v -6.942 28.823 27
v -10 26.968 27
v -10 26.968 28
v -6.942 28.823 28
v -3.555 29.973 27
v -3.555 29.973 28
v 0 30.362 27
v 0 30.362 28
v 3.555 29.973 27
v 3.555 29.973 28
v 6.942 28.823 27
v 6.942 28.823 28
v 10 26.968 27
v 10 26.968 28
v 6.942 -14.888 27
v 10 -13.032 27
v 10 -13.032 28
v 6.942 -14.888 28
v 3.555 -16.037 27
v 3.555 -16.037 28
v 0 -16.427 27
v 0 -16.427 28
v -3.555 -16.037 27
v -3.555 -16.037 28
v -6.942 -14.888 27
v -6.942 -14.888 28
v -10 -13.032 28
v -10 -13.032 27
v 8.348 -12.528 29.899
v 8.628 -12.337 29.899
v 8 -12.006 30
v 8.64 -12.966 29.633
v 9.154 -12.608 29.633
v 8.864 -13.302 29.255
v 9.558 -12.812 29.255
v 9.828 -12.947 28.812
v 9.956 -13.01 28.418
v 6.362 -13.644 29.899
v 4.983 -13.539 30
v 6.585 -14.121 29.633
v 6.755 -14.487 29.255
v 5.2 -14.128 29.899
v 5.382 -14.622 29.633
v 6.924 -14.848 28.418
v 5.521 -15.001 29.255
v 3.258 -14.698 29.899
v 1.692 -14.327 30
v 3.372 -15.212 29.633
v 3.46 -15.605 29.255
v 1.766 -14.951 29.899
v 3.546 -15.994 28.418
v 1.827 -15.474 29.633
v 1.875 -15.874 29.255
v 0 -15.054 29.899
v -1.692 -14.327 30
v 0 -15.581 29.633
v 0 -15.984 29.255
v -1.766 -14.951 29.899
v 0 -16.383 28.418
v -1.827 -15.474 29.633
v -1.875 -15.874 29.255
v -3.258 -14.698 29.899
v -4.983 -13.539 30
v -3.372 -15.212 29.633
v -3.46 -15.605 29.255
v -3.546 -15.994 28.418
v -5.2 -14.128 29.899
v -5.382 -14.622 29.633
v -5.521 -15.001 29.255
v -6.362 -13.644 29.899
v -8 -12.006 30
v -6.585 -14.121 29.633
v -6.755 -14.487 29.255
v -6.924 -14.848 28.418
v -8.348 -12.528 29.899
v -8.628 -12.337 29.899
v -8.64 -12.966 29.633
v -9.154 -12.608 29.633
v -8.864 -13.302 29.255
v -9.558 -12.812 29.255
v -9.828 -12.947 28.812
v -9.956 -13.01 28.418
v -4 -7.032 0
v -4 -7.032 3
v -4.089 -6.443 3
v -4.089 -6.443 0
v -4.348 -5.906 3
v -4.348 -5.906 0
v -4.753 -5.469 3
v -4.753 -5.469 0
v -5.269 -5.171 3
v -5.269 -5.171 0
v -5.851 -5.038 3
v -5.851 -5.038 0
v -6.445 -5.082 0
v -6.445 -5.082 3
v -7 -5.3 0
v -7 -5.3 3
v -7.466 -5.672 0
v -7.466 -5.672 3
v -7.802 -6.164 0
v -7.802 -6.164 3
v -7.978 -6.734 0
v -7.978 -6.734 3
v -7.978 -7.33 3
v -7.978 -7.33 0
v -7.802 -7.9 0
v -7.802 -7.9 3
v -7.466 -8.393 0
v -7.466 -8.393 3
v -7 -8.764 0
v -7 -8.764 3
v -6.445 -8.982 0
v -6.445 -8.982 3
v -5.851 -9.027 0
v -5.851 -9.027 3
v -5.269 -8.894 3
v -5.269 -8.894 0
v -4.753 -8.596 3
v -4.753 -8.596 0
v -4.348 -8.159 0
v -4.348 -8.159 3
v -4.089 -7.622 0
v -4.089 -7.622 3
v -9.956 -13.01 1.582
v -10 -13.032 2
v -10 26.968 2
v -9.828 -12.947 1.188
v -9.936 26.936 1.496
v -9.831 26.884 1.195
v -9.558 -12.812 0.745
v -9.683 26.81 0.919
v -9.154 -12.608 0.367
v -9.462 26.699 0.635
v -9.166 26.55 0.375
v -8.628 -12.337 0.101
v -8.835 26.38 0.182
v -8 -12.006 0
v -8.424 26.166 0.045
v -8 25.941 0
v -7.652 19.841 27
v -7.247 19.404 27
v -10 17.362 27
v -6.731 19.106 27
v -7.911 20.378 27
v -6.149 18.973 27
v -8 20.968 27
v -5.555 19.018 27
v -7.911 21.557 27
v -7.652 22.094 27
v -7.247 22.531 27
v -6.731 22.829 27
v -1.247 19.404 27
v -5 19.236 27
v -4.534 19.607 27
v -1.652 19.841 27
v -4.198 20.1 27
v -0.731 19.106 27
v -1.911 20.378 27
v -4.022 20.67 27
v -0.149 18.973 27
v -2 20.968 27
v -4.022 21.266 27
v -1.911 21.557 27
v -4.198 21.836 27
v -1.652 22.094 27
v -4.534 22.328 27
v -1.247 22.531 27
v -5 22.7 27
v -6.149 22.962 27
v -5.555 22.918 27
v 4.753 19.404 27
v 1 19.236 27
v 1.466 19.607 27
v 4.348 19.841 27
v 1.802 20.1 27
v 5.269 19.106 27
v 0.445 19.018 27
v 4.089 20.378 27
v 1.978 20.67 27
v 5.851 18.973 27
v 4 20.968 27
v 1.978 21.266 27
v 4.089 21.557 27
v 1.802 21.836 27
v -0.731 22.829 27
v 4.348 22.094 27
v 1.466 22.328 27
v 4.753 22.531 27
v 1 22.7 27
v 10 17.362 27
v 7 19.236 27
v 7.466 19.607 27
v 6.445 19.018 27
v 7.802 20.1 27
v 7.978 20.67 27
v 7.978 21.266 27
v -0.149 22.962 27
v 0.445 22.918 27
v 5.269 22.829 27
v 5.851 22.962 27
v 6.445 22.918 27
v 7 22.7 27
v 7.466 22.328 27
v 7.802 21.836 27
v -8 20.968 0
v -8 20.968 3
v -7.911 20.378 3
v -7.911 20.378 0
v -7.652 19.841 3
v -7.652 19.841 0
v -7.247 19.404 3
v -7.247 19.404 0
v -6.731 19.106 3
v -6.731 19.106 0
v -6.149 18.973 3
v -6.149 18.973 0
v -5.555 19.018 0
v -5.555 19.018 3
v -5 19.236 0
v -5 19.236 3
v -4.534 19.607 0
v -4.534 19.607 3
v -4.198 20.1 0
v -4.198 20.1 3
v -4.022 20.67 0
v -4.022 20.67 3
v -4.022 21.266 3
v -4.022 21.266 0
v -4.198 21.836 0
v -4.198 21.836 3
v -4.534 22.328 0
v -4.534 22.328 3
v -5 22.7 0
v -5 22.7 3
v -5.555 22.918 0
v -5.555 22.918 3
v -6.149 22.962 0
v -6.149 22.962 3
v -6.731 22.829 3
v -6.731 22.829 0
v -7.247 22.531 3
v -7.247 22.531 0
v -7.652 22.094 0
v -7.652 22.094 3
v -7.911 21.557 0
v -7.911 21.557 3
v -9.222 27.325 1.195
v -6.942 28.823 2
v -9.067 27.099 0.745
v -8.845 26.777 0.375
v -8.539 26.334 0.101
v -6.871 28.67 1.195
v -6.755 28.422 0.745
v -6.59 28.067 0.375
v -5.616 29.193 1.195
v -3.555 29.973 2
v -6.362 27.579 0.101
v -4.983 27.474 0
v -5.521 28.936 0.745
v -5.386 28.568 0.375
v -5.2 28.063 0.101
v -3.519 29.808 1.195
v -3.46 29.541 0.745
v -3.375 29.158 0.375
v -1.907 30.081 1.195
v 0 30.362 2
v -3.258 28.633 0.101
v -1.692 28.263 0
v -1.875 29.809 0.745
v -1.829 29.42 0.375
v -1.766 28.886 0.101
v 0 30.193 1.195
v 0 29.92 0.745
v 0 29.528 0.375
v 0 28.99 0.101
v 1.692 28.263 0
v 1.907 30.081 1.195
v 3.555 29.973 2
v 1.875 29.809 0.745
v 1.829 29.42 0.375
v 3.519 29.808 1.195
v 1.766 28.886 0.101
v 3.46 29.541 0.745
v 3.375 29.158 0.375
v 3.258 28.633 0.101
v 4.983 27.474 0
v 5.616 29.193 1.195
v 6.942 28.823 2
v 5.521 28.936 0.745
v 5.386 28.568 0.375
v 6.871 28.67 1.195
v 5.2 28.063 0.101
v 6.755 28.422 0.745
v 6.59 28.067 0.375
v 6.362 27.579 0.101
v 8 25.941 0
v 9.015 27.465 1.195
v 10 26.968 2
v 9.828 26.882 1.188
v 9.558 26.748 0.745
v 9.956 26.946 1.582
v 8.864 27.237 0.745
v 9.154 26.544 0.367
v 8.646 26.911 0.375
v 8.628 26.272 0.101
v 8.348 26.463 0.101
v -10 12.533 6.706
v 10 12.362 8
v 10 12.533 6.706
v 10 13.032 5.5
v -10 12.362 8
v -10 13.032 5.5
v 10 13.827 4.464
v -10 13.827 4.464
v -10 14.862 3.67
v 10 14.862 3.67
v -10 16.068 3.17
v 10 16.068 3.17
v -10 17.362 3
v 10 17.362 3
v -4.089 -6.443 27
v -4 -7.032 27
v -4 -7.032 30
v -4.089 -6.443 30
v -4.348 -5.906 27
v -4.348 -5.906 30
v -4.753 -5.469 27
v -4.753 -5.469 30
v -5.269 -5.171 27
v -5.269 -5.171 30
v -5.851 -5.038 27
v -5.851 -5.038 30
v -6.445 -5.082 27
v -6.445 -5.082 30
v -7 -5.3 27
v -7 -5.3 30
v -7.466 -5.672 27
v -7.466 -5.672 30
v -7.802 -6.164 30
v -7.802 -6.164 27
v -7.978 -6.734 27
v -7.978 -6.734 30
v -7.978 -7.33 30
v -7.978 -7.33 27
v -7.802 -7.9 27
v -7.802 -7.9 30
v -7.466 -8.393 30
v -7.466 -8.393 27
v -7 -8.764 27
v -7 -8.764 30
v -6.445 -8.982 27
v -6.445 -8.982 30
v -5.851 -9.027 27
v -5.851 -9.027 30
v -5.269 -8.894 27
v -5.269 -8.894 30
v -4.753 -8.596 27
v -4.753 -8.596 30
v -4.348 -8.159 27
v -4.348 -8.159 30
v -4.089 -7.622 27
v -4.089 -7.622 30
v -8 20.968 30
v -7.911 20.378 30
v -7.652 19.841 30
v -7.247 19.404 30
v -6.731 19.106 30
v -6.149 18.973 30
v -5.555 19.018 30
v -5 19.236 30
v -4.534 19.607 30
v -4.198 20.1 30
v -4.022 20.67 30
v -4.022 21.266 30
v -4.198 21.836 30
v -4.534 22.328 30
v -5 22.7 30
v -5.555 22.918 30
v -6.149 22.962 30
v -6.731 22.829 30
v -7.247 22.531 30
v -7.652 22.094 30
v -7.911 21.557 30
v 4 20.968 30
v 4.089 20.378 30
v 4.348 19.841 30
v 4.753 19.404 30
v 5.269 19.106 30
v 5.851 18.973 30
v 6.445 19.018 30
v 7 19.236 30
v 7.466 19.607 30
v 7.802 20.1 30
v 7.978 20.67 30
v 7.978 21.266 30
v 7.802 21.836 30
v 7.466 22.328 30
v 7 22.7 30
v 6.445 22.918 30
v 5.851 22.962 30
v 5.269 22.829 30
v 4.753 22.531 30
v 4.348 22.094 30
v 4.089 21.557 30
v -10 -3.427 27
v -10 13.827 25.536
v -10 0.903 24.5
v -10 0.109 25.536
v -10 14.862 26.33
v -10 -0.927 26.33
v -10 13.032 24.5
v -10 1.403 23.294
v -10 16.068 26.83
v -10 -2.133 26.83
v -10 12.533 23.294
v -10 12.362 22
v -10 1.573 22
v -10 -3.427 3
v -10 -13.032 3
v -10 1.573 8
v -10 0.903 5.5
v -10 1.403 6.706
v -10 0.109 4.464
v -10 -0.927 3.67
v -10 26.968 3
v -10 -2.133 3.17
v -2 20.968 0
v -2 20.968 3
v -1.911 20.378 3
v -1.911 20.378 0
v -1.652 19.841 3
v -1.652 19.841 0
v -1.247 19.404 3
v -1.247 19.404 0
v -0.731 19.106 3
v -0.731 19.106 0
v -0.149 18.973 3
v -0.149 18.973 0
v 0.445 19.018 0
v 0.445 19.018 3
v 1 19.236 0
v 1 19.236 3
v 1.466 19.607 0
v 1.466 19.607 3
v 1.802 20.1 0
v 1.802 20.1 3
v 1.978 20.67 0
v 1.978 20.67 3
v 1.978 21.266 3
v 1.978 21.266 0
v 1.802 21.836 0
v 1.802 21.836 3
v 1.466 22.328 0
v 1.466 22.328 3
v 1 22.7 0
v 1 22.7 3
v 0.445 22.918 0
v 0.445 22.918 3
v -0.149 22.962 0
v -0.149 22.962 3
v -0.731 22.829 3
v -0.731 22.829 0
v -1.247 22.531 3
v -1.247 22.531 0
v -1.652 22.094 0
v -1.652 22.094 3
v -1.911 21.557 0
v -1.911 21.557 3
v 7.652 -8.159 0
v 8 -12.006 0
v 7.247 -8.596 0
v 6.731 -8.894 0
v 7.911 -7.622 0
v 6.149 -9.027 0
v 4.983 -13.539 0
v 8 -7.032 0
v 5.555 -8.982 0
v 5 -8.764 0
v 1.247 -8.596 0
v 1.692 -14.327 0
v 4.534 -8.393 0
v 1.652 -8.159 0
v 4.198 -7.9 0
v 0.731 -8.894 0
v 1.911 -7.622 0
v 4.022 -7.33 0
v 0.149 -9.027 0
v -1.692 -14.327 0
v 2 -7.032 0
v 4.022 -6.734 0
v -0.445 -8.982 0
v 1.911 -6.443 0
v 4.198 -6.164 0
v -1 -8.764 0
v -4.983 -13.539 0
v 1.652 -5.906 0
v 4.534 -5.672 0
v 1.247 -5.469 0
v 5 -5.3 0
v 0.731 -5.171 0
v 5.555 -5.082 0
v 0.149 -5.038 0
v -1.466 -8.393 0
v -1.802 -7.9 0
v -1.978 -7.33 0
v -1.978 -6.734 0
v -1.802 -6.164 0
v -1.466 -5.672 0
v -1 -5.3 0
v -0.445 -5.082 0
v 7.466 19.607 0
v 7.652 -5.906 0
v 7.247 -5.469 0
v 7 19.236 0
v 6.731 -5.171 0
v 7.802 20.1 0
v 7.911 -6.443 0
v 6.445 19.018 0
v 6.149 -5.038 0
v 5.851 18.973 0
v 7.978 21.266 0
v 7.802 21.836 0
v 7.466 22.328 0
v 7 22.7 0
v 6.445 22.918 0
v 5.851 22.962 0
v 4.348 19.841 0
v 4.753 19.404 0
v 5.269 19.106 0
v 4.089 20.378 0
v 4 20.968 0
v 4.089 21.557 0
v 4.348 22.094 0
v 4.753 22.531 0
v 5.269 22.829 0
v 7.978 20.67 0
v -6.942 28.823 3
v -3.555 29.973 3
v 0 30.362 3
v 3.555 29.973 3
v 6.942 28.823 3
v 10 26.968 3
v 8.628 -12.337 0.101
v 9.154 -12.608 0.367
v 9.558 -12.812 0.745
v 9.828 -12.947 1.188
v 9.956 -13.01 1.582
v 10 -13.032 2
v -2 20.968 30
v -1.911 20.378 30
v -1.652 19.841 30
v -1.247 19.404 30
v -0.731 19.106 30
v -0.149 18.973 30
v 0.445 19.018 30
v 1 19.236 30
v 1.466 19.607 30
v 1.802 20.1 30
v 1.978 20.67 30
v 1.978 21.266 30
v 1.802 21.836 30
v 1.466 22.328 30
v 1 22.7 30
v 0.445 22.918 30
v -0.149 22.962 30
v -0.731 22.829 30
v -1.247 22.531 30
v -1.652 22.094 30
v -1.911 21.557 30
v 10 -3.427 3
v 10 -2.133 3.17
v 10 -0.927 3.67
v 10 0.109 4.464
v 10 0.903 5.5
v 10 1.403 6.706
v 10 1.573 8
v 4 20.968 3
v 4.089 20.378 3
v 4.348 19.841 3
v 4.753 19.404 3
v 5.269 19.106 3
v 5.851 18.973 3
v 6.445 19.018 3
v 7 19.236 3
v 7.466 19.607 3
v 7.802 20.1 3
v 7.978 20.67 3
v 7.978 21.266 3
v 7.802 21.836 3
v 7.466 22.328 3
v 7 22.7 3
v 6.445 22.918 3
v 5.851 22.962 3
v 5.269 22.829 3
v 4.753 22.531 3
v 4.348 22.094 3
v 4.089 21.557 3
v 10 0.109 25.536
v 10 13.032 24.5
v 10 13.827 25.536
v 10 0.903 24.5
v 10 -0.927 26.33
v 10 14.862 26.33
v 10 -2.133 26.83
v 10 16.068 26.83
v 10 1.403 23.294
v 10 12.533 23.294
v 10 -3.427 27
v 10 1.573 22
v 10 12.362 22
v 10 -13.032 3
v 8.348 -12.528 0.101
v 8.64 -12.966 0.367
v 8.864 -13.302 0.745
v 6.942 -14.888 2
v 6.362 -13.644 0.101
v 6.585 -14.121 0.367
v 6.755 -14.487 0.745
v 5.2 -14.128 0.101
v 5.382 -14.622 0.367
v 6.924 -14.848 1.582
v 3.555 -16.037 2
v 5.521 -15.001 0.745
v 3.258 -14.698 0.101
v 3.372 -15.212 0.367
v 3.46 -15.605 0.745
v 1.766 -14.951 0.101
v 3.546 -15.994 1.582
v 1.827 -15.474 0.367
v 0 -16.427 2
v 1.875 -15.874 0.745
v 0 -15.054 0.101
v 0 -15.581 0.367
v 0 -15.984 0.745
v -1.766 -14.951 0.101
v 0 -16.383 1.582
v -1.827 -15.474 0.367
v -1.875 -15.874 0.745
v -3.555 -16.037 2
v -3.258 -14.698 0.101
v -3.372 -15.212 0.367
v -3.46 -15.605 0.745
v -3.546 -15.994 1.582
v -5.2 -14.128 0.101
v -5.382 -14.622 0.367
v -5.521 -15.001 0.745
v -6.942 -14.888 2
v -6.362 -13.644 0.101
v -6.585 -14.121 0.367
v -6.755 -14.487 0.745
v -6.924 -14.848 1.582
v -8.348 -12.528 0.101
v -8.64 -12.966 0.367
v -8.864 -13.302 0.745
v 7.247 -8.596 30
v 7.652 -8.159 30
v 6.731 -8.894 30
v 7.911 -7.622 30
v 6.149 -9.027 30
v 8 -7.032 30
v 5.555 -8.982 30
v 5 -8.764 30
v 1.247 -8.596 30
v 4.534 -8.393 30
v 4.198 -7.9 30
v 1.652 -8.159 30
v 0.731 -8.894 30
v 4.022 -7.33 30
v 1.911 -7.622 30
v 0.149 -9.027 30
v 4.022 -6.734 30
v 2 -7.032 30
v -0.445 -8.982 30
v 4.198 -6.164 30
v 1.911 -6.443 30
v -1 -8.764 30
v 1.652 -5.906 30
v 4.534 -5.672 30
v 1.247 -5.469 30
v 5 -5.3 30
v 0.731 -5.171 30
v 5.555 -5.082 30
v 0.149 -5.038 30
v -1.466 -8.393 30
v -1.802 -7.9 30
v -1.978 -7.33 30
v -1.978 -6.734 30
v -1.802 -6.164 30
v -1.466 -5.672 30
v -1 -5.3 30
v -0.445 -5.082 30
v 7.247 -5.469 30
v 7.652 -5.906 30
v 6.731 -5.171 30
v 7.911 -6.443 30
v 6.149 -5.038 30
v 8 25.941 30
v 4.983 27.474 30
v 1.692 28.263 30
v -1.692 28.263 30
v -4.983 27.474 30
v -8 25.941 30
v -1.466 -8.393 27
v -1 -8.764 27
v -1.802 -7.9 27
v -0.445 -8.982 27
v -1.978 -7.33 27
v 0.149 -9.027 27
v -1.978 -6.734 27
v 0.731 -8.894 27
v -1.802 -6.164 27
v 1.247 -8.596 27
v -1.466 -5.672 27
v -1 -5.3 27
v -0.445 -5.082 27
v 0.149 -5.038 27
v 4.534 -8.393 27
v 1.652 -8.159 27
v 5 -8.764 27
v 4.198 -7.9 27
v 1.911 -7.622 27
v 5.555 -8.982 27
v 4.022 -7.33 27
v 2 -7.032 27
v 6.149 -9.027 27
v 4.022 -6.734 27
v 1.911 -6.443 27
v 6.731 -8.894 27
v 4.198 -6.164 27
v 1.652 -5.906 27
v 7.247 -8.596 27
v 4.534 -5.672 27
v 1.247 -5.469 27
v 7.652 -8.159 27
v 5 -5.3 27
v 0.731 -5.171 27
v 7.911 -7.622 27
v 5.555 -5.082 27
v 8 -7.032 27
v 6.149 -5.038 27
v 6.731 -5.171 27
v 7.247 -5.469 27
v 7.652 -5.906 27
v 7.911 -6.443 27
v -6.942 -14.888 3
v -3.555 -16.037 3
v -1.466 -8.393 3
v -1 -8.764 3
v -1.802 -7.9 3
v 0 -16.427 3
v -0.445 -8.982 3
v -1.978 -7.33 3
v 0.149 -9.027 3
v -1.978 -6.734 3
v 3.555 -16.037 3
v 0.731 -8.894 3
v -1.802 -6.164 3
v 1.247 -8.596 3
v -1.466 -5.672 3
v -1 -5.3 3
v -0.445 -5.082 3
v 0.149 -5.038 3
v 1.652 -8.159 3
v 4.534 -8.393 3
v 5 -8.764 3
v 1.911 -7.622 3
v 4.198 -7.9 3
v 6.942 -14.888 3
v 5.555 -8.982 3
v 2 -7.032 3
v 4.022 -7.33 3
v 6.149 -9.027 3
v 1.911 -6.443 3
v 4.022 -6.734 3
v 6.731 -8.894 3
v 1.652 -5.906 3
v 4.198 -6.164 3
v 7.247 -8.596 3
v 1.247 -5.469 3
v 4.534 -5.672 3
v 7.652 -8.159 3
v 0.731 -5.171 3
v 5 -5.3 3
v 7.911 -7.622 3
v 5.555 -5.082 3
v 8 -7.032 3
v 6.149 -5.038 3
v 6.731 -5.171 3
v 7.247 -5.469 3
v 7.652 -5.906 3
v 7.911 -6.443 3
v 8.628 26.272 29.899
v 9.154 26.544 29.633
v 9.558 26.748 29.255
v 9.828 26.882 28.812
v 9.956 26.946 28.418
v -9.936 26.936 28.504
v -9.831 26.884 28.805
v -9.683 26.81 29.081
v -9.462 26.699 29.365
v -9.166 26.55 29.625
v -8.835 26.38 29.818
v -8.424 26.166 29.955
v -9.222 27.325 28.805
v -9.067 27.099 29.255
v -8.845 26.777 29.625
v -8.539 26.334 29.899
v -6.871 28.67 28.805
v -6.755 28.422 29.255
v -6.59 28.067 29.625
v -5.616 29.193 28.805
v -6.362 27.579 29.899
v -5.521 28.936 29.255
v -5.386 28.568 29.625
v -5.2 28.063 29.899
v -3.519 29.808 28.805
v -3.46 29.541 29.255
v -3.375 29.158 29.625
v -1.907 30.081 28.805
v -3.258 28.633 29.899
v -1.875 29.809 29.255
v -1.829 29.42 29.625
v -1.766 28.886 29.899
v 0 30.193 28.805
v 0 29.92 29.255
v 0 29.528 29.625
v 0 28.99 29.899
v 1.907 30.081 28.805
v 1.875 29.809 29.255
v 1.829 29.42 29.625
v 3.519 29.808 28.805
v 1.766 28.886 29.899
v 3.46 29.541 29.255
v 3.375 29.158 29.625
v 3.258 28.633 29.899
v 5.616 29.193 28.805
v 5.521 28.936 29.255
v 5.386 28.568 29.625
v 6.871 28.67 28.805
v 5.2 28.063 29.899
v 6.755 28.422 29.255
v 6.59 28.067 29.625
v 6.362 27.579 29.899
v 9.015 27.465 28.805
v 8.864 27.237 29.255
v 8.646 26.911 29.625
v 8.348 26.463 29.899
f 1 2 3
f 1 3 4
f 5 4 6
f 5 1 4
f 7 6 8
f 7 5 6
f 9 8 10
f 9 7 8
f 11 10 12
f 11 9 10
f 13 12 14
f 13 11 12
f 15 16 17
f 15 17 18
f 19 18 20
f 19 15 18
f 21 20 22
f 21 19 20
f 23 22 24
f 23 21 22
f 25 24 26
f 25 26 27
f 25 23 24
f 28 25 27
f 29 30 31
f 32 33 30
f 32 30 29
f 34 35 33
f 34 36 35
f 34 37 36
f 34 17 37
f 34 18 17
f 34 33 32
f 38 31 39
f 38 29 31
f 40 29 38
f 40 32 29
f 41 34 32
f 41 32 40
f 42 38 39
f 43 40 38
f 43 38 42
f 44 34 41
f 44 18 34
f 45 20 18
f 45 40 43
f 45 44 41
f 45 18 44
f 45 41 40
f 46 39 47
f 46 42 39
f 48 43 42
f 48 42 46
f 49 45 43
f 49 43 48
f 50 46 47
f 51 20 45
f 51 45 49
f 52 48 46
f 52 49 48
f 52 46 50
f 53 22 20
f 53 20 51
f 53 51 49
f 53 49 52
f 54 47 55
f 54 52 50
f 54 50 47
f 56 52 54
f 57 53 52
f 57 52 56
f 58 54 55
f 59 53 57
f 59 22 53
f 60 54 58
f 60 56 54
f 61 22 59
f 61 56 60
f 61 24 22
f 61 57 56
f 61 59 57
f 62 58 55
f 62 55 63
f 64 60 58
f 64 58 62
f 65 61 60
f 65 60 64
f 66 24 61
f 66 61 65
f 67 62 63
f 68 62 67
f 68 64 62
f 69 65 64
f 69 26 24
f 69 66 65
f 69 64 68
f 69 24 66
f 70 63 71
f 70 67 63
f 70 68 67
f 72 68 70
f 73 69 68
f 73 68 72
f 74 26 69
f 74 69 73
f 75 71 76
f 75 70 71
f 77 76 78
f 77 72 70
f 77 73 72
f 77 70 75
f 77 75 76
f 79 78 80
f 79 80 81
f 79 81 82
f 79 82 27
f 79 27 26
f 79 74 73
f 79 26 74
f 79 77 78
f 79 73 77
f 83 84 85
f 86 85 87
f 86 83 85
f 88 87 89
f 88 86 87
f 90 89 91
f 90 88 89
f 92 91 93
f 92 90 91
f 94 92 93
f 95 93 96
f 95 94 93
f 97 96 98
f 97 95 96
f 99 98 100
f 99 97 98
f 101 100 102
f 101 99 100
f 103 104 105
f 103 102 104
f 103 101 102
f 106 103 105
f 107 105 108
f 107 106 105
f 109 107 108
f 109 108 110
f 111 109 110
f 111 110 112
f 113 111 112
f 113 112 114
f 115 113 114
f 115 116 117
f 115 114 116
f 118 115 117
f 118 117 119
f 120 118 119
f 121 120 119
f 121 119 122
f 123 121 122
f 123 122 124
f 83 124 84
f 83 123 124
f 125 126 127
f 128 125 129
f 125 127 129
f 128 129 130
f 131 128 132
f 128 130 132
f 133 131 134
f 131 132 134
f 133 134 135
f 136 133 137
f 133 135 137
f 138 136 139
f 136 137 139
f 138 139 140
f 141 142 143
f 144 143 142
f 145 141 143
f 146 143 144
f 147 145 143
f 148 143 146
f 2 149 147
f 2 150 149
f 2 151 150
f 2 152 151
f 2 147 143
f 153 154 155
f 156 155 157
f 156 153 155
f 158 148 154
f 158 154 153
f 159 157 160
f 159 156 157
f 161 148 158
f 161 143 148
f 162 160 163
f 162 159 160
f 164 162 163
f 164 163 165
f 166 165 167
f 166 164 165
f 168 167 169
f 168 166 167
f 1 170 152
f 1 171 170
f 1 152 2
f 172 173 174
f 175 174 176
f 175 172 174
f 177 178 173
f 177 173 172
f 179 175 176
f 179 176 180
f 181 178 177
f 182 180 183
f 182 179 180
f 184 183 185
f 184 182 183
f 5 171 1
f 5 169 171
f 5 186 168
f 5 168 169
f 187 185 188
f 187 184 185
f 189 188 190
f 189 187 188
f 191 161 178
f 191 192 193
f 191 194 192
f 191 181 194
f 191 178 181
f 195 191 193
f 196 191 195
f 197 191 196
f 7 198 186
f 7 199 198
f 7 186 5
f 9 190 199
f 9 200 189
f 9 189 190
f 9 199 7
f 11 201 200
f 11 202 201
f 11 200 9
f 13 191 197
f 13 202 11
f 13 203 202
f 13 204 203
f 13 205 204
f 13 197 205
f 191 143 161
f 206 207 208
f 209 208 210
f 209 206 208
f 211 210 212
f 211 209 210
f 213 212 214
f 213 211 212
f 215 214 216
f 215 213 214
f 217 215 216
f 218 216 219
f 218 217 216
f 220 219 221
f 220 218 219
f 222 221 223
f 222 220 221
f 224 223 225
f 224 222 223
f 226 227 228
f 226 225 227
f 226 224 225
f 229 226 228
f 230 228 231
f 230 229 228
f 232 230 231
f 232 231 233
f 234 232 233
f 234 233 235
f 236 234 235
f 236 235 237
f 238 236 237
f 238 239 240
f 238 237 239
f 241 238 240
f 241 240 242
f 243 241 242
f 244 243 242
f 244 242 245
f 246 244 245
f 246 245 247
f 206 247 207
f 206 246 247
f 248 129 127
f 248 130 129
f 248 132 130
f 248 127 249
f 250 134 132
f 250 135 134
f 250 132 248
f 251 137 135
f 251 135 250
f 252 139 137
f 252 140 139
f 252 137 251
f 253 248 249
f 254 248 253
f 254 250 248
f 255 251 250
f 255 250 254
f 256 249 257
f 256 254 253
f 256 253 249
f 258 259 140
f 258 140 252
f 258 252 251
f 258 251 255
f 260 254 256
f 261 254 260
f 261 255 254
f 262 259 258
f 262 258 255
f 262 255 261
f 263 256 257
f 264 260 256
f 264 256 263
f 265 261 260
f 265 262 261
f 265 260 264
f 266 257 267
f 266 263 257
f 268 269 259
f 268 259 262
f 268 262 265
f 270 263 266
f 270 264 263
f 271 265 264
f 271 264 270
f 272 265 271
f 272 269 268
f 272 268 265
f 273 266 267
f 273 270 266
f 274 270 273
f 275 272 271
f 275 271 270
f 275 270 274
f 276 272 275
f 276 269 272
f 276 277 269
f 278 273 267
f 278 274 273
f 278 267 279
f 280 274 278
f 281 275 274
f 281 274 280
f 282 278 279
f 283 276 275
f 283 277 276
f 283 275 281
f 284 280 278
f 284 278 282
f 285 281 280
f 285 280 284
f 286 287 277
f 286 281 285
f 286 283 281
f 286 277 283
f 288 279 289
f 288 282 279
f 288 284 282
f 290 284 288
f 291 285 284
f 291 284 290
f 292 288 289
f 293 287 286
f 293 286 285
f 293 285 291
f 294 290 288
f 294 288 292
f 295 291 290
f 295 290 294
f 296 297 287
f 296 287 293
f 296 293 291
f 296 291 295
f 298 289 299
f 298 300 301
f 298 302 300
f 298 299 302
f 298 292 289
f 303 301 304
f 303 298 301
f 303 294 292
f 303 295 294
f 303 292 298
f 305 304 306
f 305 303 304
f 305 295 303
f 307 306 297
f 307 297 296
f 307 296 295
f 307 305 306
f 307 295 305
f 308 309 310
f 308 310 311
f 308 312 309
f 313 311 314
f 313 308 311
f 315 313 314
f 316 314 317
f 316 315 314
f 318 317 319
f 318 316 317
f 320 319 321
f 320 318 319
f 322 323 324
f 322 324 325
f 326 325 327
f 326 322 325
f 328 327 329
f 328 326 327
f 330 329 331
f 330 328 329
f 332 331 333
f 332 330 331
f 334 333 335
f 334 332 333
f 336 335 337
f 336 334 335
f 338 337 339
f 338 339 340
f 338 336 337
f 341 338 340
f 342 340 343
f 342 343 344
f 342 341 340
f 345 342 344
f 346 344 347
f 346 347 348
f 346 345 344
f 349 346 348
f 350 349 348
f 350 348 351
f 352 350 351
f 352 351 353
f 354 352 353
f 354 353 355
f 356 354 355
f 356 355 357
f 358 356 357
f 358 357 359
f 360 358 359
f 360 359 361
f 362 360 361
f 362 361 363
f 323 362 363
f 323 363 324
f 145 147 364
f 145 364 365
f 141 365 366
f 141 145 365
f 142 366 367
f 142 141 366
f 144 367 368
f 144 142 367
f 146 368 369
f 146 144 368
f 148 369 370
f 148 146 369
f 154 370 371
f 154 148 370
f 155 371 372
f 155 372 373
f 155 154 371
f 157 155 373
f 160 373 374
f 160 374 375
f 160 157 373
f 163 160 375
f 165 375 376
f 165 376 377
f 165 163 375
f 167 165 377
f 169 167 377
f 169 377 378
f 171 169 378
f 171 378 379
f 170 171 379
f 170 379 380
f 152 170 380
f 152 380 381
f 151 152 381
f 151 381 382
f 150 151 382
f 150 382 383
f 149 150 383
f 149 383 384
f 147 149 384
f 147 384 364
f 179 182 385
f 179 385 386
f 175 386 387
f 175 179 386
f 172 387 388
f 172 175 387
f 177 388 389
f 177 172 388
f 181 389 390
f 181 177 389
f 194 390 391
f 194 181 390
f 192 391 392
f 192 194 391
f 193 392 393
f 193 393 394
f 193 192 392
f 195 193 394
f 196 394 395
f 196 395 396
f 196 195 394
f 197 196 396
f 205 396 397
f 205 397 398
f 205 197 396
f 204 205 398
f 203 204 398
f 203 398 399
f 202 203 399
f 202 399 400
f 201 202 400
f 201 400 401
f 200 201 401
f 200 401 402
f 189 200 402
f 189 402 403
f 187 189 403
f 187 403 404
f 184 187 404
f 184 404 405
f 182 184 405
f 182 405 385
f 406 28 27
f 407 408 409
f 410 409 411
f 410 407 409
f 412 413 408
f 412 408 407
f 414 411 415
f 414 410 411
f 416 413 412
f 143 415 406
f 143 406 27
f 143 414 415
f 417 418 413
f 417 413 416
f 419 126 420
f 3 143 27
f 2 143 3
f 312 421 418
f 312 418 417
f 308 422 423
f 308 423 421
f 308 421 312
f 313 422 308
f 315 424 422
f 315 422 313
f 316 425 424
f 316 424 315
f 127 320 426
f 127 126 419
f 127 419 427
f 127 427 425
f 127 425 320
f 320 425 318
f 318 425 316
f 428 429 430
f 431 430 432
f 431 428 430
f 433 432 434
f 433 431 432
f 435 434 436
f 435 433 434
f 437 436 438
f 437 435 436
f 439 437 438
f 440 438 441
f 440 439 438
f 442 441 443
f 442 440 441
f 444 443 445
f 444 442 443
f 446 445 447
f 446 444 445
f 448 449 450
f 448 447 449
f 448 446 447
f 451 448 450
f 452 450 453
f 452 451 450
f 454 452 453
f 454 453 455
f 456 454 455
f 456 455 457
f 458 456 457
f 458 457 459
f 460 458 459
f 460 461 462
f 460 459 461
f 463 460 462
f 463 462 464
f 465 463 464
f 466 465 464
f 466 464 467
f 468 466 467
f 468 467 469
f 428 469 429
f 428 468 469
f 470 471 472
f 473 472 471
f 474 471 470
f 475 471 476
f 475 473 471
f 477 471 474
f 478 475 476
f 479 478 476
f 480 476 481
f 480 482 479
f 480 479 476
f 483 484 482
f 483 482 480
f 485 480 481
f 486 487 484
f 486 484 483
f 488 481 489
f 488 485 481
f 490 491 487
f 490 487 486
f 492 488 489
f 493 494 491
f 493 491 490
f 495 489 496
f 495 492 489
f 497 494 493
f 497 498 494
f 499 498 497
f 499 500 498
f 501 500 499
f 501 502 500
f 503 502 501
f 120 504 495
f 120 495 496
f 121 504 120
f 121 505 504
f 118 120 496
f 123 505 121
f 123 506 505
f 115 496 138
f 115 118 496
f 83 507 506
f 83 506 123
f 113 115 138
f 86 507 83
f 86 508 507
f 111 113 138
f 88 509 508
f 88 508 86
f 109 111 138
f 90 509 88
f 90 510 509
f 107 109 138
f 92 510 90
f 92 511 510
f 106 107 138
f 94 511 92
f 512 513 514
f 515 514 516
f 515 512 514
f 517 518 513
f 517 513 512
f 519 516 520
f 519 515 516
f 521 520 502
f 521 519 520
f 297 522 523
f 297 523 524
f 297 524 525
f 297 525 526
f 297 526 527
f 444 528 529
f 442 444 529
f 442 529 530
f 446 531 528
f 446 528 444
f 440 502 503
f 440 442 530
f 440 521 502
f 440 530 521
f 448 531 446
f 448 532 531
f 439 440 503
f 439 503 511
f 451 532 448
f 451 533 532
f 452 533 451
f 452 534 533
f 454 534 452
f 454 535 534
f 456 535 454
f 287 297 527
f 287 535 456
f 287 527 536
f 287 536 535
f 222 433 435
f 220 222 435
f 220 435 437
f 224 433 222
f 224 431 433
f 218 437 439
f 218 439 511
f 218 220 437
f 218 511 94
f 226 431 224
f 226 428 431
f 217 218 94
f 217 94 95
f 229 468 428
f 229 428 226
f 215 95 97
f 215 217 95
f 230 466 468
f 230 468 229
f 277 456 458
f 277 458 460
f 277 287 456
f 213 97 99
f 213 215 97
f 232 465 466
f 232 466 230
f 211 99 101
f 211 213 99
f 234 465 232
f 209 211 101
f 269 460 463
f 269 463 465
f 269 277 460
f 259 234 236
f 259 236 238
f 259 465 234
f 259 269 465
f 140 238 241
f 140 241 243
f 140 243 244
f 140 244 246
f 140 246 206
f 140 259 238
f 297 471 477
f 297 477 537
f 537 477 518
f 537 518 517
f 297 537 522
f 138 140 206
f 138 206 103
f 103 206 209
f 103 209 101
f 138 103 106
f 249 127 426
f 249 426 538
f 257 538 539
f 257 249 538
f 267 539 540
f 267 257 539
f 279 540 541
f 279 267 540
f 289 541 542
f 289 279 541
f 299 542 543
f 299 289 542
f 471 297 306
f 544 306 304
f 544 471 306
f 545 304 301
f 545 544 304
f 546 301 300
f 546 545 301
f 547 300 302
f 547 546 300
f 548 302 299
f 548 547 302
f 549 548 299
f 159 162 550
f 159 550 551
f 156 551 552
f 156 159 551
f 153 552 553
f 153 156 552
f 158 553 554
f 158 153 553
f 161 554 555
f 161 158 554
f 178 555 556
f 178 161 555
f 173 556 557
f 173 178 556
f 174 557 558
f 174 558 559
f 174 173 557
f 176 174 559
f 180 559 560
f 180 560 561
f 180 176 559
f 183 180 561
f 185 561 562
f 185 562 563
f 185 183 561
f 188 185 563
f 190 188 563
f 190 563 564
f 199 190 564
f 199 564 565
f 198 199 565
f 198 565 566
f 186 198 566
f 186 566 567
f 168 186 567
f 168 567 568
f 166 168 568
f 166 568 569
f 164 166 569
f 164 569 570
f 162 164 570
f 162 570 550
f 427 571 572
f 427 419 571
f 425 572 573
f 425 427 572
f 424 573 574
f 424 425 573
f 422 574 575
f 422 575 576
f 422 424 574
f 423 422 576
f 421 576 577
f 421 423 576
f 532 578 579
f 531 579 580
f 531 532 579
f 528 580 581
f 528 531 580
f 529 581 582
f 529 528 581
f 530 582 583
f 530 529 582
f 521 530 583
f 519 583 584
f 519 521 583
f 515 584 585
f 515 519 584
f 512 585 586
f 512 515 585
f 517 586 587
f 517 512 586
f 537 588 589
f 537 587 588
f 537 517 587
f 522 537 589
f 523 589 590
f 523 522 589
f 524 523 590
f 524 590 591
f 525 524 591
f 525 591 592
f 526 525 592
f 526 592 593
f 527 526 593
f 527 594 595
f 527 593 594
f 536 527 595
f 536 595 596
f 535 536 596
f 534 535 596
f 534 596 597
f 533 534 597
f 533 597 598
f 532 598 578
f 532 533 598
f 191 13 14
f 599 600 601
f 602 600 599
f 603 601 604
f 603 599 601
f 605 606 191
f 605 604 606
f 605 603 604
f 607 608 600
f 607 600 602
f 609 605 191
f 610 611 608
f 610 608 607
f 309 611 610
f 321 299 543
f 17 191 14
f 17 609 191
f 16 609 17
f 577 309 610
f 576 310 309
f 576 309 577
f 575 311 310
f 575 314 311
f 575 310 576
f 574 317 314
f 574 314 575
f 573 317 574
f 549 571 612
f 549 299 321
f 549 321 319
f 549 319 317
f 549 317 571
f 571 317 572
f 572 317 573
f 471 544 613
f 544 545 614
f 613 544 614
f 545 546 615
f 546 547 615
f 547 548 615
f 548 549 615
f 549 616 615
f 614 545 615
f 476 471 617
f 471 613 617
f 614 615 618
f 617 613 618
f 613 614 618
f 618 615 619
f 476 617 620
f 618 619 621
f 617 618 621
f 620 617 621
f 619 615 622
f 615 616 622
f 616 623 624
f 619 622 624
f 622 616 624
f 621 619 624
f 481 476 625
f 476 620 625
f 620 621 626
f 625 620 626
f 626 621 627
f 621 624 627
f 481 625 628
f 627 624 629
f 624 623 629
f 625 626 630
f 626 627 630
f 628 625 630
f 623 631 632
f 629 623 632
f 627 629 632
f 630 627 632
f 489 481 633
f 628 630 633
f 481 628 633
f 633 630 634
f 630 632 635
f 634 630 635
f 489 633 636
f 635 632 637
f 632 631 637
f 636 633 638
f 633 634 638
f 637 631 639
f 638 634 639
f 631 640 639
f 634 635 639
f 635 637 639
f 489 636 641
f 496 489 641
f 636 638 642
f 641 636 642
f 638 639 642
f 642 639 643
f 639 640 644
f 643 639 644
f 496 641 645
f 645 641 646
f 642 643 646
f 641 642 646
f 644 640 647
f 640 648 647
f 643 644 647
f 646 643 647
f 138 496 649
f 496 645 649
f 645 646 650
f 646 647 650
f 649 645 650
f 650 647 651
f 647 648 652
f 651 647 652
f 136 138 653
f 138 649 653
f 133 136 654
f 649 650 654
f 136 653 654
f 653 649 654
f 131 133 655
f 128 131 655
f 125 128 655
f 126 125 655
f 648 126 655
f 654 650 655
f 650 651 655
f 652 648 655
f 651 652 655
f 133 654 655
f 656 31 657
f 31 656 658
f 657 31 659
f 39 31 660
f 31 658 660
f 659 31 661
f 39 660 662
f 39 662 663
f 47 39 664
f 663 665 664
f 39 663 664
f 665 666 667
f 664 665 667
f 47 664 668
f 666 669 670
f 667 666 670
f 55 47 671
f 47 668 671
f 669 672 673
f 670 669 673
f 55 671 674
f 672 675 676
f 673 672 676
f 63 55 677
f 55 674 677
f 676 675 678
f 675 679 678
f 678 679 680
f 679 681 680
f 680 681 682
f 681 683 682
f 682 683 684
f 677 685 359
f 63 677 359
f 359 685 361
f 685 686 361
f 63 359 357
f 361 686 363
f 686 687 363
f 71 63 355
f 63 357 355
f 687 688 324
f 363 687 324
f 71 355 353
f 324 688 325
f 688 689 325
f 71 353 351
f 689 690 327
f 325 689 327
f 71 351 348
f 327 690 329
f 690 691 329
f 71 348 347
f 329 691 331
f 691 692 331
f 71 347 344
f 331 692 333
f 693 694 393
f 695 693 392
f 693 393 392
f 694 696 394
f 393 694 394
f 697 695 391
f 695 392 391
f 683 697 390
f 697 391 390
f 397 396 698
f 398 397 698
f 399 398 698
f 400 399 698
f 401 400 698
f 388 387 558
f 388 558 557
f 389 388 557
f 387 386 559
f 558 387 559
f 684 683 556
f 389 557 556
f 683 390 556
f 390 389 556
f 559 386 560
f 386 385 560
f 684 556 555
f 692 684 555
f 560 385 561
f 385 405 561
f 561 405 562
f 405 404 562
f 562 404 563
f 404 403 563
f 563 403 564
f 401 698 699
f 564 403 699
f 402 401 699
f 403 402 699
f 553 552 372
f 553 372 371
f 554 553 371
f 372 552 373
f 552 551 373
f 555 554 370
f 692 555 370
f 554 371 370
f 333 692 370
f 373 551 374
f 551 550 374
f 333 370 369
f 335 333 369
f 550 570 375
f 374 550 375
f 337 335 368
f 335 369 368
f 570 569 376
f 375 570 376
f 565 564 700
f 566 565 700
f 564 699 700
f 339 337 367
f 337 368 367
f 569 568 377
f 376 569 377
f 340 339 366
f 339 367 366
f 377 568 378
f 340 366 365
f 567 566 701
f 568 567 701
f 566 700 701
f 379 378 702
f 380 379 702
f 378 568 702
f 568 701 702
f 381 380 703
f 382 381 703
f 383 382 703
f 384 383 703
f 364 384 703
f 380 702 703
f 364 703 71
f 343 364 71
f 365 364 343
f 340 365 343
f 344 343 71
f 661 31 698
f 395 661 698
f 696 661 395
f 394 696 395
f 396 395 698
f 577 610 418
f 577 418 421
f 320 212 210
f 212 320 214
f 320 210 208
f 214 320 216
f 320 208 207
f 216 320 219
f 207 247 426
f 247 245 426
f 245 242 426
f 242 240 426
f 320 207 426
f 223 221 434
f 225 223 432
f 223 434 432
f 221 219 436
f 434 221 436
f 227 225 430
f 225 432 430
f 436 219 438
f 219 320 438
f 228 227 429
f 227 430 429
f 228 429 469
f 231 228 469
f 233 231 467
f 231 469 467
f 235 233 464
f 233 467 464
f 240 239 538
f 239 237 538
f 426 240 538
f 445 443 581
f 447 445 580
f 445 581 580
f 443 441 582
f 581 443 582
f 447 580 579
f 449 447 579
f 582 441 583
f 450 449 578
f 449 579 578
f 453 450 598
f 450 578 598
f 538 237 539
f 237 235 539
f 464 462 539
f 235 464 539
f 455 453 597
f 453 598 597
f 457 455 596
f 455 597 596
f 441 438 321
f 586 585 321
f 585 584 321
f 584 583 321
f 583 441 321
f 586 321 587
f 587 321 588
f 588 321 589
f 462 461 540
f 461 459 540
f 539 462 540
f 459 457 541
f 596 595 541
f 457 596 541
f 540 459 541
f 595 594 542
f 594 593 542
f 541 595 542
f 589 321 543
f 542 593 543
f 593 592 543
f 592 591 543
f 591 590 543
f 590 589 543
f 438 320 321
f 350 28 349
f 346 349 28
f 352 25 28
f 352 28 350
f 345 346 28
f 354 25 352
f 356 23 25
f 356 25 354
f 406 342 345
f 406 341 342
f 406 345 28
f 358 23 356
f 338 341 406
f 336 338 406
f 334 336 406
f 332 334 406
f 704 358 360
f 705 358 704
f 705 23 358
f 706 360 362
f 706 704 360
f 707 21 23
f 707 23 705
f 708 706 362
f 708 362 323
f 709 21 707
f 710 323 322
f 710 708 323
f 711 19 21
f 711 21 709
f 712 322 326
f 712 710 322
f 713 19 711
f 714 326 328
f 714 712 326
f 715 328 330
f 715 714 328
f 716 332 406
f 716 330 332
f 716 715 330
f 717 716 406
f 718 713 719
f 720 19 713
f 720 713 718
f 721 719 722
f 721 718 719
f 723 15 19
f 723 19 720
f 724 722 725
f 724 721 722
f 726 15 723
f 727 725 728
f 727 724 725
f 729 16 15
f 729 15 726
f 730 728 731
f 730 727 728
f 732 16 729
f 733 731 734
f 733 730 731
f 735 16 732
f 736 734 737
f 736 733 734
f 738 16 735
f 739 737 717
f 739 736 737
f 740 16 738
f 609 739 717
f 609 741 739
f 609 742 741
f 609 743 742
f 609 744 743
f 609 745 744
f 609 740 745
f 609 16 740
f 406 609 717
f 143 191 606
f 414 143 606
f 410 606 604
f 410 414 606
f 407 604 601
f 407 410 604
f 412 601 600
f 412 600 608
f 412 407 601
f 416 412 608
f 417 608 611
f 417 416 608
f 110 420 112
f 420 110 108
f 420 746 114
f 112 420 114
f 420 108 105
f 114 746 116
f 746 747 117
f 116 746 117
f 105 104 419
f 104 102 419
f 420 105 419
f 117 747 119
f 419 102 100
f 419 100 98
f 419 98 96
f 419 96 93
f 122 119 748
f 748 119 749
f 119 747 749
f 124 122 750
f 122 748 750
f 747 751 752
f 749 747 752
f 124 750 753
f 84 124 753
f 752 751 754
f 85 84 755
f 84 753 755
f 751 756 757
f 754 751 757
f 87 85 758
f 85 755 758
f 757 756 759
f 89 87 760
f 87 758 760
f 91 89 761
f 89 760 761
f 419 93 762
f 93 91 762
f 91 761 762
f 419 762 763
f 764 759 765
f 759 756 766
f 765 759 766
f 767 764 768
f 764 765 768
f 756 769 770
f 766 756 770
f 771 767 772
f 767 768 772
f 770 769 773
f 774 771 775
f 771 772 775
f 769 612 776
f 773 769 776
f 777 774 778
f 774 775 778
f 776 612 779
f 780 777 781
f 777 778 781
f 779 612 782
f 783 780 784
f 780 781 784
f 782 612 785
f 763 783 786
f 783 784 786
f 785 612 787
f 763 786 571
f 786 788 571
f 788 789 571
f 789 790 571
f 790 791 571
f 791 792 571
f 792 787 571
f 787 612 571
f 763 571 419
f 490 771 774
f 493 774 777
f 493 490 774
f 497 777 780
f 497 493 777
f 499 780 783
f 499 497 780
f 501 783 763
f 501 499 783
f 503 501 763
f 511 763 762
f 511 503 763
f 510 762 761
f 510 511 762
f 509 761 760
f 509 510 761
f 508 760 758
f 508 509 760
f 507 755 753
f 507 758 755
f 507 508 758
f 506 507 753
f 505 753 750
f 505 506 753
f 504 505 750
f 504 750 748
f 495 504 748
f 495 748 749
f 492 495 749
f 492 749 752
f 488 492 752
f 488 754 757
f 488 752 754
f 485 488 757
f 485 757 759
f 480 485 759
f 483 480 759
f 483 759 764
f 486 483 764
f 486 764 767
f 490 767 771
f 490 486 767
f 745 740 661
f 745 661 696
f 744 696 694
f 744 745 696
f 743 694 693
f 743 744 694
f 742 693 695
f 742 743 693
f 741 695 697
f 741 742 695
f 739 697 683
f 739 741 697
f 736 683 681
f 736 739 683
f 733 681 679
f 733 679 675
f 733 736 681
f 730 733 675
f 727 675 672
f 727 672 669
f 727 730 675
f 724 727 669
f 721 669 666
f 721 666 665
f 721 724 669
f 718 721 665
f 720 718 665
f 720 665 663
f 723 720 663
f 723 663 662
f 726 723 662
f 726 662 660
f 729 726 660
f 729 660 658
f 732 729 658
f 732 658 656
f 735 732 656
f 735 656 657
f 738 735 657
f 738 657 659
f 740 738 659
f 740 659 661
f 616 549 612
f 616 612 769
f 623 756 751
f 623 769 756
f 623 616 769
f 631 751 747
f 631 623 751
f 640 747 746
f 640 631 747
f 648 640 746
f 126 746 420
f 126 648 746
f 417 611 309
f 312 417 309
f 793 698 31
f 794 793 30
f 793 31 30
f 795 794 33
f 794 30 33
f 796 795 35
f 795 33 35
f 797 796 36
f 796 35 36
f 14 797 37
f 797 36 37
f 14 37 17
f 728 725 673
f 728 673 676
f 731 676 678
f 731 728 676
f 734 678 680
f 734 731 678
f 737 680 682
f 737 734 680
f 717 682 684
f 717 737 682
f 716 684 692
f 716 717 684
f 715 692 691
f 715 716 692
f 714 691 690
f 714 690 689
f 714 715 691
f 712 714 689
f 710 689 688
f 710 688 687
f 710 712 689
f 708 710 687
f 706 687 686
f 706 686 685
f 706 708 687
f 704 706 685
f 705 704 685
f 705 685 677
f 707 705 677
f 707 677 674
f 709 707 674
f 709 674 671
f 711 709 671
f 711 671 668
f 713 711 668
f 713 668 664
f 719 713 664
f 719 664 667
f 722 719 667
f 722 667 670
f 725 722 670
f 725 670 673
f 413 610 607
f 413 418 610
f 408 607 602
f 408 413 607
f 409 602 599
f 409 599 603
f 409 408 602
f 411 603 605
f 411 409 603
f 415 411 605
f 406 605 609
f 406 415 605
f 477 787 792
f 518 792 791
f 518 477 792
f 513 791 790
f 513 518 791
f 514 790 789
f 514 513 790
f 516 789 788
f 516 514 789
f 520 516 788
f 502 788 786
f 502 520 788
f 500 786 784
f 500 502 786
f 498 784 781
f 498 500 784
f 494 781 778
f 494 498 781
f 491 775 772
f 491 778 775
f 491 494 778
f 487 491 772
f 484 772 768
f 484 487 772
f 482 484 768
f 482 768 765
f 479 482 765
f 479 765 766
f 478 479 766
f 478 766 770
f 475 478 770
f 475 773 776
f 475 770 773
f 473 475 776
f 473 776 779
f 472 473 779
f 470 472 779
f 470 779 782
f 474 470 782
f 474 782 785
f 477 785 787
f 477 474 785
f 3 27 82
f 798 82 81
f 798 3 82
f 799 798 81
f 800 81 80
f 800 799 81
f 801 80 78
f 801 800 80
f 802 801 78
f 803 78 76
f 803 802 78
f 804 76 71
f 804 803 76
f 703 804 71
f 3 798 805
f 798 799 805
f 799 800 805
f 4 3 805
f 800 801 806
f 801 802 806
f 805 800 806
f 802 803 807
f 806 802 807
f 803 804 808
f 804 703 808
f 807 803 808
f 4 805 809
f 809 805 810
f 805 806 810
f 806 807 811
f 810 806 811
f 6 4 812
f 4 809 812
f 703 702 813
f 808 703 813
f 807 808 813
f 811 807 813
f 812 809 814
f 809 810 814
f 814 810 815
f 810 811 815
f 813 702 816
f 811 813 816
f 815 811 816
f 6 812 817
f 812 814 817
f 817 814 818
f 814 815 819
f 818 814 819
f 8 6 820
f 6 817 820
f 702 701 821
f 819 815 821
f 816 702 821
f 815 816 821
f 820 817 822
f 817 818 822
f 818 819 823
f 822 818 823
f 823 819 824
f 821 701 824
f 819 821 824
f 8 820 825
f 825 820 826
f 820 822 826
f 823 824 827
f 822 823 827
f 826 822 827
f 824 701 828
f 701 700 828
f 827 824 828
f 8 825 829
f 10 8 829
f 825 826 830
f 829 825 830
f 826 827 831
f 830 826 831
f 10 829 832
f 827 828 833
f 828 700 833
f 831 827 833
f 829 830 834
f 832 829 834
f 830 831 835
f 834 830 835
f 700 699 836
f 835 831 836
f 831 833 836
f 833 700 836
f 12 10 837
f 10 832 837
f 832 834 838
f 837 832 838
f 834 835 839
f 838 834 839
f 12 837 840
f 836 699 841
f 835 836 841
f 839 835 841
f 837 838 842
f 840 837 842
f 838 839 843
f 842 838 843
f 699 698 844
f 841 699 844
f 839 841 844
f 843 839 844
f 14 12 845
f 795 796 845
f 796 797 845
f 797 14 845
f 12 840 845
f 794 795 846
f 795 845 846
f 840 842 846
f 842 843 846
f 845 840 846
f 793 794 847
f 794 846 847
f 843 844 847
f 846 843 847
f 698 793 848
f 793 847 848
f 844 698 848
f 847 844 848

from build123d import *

# Parameters (mm, degrees)
SKETCH1_R           = 2
BOSS_EXTRUDE1_DEPTH = 30
SKETCH2_W           = 24
SKETCH2_H           = 18
CUT_EXTRUDE1_DEPTH  = 48.136701039
FILLET1_R           = 5
FILLET2_R           = 2


with BuildPart() as part:
    # Sketch1 → Boss-Extrude1 (new body)
    with BuildSketch(Plane.XY):
        with BuildLine():
            Line((-10, -13.032253728), (-10, 26.967746272))
            ThreePointArc((-10, 26.967746272), (0, 30.36228886), (10, 26.967746272))
            Line((10, 26.967746272), (10, -13.032253728))
            ThreePointArc((10, -13.032253728), (0, -16.426796317), (-10, -13.032253728))
        make_face()
        with Locations((0, -7.032253728)):
            Circle(SKETCH1_R, mode=Mode.SUBTRACT)
        with Locations((6, -7.032253728)):
            Circle(SKETCH1_R, mode=Mode.SUBTRACT)
        with Locations((-6, -7.032253728)):
            Circle(SKETCH1_R, mode=Mode.SUBTRACT)
        with Locations(Location((6, 20.967746272, 0), (0, 0, 180))):
            Circle(SKETCH1_R, mode=Mode.SUBTRACT)
        with Locations(Location((0, 20.967746272, 0), (0, 0, 180))):
            Circle(SKETCH1_R, mode=Mode.SUBTRACT)
        with Locations(Location((-6, 20.967746272, 0), (0, 0, 180))):
            Circle(SKETCH1_R, mode=Mode.SUBTRACT)
    extrude(amount=BOSS_EXTRUDE1_DEPTH)

    # Sketch2 → Cut-Extrude1 (cut, through all)
    with BuildSketch(Plane(origin=(10, 0, 0), x_dir=(0, 0, -1), z_dir=(1, 0, 0))):
        with Locations((-15, -7.426796317)):
            Rectangle(SKETCH2_W, SKETCH2_H)
        with Locations((-15, 21.36228886)):
            Rectangle(SKETCH2_W, SKETCH2_H)
    extrude(amount=-CUT_EXTRUDE1_DEPTH, mode=Mode.SUBTRACT)

    # Fillet1
    fillet1_edges = [part.edges().sort_by_distance(p)[0] for p in [
        (0, 1.573203683, 3),
        (0, 1.573203683, 27),
        (0, 12.36228886, 27),
        (0, 12.36228886, 3),
    ]]
    fillet(fillet1_edges, radius=FILLET1_R)

    # Fillet2
    fillet2_edges = [part.edges().sort_by_distance(p)[0] for p in [
        (0, -16.426796317, 30),
        (10, 6.967746272, 30),
        (0, 30.36228886, 30),
        (10, 6.967746272, 0),
        (0, -16.426796317, 0),
        (-10, 6.967746272, 0),
        (0, 30.36228886, 0),
        (-10, 6.967746272, 30),
    ]]
    fillet(fillet2_edges, radius=FILLET2_R - 0.0001)  # a hair under: the kernel refuses the full size


solid = part.part
